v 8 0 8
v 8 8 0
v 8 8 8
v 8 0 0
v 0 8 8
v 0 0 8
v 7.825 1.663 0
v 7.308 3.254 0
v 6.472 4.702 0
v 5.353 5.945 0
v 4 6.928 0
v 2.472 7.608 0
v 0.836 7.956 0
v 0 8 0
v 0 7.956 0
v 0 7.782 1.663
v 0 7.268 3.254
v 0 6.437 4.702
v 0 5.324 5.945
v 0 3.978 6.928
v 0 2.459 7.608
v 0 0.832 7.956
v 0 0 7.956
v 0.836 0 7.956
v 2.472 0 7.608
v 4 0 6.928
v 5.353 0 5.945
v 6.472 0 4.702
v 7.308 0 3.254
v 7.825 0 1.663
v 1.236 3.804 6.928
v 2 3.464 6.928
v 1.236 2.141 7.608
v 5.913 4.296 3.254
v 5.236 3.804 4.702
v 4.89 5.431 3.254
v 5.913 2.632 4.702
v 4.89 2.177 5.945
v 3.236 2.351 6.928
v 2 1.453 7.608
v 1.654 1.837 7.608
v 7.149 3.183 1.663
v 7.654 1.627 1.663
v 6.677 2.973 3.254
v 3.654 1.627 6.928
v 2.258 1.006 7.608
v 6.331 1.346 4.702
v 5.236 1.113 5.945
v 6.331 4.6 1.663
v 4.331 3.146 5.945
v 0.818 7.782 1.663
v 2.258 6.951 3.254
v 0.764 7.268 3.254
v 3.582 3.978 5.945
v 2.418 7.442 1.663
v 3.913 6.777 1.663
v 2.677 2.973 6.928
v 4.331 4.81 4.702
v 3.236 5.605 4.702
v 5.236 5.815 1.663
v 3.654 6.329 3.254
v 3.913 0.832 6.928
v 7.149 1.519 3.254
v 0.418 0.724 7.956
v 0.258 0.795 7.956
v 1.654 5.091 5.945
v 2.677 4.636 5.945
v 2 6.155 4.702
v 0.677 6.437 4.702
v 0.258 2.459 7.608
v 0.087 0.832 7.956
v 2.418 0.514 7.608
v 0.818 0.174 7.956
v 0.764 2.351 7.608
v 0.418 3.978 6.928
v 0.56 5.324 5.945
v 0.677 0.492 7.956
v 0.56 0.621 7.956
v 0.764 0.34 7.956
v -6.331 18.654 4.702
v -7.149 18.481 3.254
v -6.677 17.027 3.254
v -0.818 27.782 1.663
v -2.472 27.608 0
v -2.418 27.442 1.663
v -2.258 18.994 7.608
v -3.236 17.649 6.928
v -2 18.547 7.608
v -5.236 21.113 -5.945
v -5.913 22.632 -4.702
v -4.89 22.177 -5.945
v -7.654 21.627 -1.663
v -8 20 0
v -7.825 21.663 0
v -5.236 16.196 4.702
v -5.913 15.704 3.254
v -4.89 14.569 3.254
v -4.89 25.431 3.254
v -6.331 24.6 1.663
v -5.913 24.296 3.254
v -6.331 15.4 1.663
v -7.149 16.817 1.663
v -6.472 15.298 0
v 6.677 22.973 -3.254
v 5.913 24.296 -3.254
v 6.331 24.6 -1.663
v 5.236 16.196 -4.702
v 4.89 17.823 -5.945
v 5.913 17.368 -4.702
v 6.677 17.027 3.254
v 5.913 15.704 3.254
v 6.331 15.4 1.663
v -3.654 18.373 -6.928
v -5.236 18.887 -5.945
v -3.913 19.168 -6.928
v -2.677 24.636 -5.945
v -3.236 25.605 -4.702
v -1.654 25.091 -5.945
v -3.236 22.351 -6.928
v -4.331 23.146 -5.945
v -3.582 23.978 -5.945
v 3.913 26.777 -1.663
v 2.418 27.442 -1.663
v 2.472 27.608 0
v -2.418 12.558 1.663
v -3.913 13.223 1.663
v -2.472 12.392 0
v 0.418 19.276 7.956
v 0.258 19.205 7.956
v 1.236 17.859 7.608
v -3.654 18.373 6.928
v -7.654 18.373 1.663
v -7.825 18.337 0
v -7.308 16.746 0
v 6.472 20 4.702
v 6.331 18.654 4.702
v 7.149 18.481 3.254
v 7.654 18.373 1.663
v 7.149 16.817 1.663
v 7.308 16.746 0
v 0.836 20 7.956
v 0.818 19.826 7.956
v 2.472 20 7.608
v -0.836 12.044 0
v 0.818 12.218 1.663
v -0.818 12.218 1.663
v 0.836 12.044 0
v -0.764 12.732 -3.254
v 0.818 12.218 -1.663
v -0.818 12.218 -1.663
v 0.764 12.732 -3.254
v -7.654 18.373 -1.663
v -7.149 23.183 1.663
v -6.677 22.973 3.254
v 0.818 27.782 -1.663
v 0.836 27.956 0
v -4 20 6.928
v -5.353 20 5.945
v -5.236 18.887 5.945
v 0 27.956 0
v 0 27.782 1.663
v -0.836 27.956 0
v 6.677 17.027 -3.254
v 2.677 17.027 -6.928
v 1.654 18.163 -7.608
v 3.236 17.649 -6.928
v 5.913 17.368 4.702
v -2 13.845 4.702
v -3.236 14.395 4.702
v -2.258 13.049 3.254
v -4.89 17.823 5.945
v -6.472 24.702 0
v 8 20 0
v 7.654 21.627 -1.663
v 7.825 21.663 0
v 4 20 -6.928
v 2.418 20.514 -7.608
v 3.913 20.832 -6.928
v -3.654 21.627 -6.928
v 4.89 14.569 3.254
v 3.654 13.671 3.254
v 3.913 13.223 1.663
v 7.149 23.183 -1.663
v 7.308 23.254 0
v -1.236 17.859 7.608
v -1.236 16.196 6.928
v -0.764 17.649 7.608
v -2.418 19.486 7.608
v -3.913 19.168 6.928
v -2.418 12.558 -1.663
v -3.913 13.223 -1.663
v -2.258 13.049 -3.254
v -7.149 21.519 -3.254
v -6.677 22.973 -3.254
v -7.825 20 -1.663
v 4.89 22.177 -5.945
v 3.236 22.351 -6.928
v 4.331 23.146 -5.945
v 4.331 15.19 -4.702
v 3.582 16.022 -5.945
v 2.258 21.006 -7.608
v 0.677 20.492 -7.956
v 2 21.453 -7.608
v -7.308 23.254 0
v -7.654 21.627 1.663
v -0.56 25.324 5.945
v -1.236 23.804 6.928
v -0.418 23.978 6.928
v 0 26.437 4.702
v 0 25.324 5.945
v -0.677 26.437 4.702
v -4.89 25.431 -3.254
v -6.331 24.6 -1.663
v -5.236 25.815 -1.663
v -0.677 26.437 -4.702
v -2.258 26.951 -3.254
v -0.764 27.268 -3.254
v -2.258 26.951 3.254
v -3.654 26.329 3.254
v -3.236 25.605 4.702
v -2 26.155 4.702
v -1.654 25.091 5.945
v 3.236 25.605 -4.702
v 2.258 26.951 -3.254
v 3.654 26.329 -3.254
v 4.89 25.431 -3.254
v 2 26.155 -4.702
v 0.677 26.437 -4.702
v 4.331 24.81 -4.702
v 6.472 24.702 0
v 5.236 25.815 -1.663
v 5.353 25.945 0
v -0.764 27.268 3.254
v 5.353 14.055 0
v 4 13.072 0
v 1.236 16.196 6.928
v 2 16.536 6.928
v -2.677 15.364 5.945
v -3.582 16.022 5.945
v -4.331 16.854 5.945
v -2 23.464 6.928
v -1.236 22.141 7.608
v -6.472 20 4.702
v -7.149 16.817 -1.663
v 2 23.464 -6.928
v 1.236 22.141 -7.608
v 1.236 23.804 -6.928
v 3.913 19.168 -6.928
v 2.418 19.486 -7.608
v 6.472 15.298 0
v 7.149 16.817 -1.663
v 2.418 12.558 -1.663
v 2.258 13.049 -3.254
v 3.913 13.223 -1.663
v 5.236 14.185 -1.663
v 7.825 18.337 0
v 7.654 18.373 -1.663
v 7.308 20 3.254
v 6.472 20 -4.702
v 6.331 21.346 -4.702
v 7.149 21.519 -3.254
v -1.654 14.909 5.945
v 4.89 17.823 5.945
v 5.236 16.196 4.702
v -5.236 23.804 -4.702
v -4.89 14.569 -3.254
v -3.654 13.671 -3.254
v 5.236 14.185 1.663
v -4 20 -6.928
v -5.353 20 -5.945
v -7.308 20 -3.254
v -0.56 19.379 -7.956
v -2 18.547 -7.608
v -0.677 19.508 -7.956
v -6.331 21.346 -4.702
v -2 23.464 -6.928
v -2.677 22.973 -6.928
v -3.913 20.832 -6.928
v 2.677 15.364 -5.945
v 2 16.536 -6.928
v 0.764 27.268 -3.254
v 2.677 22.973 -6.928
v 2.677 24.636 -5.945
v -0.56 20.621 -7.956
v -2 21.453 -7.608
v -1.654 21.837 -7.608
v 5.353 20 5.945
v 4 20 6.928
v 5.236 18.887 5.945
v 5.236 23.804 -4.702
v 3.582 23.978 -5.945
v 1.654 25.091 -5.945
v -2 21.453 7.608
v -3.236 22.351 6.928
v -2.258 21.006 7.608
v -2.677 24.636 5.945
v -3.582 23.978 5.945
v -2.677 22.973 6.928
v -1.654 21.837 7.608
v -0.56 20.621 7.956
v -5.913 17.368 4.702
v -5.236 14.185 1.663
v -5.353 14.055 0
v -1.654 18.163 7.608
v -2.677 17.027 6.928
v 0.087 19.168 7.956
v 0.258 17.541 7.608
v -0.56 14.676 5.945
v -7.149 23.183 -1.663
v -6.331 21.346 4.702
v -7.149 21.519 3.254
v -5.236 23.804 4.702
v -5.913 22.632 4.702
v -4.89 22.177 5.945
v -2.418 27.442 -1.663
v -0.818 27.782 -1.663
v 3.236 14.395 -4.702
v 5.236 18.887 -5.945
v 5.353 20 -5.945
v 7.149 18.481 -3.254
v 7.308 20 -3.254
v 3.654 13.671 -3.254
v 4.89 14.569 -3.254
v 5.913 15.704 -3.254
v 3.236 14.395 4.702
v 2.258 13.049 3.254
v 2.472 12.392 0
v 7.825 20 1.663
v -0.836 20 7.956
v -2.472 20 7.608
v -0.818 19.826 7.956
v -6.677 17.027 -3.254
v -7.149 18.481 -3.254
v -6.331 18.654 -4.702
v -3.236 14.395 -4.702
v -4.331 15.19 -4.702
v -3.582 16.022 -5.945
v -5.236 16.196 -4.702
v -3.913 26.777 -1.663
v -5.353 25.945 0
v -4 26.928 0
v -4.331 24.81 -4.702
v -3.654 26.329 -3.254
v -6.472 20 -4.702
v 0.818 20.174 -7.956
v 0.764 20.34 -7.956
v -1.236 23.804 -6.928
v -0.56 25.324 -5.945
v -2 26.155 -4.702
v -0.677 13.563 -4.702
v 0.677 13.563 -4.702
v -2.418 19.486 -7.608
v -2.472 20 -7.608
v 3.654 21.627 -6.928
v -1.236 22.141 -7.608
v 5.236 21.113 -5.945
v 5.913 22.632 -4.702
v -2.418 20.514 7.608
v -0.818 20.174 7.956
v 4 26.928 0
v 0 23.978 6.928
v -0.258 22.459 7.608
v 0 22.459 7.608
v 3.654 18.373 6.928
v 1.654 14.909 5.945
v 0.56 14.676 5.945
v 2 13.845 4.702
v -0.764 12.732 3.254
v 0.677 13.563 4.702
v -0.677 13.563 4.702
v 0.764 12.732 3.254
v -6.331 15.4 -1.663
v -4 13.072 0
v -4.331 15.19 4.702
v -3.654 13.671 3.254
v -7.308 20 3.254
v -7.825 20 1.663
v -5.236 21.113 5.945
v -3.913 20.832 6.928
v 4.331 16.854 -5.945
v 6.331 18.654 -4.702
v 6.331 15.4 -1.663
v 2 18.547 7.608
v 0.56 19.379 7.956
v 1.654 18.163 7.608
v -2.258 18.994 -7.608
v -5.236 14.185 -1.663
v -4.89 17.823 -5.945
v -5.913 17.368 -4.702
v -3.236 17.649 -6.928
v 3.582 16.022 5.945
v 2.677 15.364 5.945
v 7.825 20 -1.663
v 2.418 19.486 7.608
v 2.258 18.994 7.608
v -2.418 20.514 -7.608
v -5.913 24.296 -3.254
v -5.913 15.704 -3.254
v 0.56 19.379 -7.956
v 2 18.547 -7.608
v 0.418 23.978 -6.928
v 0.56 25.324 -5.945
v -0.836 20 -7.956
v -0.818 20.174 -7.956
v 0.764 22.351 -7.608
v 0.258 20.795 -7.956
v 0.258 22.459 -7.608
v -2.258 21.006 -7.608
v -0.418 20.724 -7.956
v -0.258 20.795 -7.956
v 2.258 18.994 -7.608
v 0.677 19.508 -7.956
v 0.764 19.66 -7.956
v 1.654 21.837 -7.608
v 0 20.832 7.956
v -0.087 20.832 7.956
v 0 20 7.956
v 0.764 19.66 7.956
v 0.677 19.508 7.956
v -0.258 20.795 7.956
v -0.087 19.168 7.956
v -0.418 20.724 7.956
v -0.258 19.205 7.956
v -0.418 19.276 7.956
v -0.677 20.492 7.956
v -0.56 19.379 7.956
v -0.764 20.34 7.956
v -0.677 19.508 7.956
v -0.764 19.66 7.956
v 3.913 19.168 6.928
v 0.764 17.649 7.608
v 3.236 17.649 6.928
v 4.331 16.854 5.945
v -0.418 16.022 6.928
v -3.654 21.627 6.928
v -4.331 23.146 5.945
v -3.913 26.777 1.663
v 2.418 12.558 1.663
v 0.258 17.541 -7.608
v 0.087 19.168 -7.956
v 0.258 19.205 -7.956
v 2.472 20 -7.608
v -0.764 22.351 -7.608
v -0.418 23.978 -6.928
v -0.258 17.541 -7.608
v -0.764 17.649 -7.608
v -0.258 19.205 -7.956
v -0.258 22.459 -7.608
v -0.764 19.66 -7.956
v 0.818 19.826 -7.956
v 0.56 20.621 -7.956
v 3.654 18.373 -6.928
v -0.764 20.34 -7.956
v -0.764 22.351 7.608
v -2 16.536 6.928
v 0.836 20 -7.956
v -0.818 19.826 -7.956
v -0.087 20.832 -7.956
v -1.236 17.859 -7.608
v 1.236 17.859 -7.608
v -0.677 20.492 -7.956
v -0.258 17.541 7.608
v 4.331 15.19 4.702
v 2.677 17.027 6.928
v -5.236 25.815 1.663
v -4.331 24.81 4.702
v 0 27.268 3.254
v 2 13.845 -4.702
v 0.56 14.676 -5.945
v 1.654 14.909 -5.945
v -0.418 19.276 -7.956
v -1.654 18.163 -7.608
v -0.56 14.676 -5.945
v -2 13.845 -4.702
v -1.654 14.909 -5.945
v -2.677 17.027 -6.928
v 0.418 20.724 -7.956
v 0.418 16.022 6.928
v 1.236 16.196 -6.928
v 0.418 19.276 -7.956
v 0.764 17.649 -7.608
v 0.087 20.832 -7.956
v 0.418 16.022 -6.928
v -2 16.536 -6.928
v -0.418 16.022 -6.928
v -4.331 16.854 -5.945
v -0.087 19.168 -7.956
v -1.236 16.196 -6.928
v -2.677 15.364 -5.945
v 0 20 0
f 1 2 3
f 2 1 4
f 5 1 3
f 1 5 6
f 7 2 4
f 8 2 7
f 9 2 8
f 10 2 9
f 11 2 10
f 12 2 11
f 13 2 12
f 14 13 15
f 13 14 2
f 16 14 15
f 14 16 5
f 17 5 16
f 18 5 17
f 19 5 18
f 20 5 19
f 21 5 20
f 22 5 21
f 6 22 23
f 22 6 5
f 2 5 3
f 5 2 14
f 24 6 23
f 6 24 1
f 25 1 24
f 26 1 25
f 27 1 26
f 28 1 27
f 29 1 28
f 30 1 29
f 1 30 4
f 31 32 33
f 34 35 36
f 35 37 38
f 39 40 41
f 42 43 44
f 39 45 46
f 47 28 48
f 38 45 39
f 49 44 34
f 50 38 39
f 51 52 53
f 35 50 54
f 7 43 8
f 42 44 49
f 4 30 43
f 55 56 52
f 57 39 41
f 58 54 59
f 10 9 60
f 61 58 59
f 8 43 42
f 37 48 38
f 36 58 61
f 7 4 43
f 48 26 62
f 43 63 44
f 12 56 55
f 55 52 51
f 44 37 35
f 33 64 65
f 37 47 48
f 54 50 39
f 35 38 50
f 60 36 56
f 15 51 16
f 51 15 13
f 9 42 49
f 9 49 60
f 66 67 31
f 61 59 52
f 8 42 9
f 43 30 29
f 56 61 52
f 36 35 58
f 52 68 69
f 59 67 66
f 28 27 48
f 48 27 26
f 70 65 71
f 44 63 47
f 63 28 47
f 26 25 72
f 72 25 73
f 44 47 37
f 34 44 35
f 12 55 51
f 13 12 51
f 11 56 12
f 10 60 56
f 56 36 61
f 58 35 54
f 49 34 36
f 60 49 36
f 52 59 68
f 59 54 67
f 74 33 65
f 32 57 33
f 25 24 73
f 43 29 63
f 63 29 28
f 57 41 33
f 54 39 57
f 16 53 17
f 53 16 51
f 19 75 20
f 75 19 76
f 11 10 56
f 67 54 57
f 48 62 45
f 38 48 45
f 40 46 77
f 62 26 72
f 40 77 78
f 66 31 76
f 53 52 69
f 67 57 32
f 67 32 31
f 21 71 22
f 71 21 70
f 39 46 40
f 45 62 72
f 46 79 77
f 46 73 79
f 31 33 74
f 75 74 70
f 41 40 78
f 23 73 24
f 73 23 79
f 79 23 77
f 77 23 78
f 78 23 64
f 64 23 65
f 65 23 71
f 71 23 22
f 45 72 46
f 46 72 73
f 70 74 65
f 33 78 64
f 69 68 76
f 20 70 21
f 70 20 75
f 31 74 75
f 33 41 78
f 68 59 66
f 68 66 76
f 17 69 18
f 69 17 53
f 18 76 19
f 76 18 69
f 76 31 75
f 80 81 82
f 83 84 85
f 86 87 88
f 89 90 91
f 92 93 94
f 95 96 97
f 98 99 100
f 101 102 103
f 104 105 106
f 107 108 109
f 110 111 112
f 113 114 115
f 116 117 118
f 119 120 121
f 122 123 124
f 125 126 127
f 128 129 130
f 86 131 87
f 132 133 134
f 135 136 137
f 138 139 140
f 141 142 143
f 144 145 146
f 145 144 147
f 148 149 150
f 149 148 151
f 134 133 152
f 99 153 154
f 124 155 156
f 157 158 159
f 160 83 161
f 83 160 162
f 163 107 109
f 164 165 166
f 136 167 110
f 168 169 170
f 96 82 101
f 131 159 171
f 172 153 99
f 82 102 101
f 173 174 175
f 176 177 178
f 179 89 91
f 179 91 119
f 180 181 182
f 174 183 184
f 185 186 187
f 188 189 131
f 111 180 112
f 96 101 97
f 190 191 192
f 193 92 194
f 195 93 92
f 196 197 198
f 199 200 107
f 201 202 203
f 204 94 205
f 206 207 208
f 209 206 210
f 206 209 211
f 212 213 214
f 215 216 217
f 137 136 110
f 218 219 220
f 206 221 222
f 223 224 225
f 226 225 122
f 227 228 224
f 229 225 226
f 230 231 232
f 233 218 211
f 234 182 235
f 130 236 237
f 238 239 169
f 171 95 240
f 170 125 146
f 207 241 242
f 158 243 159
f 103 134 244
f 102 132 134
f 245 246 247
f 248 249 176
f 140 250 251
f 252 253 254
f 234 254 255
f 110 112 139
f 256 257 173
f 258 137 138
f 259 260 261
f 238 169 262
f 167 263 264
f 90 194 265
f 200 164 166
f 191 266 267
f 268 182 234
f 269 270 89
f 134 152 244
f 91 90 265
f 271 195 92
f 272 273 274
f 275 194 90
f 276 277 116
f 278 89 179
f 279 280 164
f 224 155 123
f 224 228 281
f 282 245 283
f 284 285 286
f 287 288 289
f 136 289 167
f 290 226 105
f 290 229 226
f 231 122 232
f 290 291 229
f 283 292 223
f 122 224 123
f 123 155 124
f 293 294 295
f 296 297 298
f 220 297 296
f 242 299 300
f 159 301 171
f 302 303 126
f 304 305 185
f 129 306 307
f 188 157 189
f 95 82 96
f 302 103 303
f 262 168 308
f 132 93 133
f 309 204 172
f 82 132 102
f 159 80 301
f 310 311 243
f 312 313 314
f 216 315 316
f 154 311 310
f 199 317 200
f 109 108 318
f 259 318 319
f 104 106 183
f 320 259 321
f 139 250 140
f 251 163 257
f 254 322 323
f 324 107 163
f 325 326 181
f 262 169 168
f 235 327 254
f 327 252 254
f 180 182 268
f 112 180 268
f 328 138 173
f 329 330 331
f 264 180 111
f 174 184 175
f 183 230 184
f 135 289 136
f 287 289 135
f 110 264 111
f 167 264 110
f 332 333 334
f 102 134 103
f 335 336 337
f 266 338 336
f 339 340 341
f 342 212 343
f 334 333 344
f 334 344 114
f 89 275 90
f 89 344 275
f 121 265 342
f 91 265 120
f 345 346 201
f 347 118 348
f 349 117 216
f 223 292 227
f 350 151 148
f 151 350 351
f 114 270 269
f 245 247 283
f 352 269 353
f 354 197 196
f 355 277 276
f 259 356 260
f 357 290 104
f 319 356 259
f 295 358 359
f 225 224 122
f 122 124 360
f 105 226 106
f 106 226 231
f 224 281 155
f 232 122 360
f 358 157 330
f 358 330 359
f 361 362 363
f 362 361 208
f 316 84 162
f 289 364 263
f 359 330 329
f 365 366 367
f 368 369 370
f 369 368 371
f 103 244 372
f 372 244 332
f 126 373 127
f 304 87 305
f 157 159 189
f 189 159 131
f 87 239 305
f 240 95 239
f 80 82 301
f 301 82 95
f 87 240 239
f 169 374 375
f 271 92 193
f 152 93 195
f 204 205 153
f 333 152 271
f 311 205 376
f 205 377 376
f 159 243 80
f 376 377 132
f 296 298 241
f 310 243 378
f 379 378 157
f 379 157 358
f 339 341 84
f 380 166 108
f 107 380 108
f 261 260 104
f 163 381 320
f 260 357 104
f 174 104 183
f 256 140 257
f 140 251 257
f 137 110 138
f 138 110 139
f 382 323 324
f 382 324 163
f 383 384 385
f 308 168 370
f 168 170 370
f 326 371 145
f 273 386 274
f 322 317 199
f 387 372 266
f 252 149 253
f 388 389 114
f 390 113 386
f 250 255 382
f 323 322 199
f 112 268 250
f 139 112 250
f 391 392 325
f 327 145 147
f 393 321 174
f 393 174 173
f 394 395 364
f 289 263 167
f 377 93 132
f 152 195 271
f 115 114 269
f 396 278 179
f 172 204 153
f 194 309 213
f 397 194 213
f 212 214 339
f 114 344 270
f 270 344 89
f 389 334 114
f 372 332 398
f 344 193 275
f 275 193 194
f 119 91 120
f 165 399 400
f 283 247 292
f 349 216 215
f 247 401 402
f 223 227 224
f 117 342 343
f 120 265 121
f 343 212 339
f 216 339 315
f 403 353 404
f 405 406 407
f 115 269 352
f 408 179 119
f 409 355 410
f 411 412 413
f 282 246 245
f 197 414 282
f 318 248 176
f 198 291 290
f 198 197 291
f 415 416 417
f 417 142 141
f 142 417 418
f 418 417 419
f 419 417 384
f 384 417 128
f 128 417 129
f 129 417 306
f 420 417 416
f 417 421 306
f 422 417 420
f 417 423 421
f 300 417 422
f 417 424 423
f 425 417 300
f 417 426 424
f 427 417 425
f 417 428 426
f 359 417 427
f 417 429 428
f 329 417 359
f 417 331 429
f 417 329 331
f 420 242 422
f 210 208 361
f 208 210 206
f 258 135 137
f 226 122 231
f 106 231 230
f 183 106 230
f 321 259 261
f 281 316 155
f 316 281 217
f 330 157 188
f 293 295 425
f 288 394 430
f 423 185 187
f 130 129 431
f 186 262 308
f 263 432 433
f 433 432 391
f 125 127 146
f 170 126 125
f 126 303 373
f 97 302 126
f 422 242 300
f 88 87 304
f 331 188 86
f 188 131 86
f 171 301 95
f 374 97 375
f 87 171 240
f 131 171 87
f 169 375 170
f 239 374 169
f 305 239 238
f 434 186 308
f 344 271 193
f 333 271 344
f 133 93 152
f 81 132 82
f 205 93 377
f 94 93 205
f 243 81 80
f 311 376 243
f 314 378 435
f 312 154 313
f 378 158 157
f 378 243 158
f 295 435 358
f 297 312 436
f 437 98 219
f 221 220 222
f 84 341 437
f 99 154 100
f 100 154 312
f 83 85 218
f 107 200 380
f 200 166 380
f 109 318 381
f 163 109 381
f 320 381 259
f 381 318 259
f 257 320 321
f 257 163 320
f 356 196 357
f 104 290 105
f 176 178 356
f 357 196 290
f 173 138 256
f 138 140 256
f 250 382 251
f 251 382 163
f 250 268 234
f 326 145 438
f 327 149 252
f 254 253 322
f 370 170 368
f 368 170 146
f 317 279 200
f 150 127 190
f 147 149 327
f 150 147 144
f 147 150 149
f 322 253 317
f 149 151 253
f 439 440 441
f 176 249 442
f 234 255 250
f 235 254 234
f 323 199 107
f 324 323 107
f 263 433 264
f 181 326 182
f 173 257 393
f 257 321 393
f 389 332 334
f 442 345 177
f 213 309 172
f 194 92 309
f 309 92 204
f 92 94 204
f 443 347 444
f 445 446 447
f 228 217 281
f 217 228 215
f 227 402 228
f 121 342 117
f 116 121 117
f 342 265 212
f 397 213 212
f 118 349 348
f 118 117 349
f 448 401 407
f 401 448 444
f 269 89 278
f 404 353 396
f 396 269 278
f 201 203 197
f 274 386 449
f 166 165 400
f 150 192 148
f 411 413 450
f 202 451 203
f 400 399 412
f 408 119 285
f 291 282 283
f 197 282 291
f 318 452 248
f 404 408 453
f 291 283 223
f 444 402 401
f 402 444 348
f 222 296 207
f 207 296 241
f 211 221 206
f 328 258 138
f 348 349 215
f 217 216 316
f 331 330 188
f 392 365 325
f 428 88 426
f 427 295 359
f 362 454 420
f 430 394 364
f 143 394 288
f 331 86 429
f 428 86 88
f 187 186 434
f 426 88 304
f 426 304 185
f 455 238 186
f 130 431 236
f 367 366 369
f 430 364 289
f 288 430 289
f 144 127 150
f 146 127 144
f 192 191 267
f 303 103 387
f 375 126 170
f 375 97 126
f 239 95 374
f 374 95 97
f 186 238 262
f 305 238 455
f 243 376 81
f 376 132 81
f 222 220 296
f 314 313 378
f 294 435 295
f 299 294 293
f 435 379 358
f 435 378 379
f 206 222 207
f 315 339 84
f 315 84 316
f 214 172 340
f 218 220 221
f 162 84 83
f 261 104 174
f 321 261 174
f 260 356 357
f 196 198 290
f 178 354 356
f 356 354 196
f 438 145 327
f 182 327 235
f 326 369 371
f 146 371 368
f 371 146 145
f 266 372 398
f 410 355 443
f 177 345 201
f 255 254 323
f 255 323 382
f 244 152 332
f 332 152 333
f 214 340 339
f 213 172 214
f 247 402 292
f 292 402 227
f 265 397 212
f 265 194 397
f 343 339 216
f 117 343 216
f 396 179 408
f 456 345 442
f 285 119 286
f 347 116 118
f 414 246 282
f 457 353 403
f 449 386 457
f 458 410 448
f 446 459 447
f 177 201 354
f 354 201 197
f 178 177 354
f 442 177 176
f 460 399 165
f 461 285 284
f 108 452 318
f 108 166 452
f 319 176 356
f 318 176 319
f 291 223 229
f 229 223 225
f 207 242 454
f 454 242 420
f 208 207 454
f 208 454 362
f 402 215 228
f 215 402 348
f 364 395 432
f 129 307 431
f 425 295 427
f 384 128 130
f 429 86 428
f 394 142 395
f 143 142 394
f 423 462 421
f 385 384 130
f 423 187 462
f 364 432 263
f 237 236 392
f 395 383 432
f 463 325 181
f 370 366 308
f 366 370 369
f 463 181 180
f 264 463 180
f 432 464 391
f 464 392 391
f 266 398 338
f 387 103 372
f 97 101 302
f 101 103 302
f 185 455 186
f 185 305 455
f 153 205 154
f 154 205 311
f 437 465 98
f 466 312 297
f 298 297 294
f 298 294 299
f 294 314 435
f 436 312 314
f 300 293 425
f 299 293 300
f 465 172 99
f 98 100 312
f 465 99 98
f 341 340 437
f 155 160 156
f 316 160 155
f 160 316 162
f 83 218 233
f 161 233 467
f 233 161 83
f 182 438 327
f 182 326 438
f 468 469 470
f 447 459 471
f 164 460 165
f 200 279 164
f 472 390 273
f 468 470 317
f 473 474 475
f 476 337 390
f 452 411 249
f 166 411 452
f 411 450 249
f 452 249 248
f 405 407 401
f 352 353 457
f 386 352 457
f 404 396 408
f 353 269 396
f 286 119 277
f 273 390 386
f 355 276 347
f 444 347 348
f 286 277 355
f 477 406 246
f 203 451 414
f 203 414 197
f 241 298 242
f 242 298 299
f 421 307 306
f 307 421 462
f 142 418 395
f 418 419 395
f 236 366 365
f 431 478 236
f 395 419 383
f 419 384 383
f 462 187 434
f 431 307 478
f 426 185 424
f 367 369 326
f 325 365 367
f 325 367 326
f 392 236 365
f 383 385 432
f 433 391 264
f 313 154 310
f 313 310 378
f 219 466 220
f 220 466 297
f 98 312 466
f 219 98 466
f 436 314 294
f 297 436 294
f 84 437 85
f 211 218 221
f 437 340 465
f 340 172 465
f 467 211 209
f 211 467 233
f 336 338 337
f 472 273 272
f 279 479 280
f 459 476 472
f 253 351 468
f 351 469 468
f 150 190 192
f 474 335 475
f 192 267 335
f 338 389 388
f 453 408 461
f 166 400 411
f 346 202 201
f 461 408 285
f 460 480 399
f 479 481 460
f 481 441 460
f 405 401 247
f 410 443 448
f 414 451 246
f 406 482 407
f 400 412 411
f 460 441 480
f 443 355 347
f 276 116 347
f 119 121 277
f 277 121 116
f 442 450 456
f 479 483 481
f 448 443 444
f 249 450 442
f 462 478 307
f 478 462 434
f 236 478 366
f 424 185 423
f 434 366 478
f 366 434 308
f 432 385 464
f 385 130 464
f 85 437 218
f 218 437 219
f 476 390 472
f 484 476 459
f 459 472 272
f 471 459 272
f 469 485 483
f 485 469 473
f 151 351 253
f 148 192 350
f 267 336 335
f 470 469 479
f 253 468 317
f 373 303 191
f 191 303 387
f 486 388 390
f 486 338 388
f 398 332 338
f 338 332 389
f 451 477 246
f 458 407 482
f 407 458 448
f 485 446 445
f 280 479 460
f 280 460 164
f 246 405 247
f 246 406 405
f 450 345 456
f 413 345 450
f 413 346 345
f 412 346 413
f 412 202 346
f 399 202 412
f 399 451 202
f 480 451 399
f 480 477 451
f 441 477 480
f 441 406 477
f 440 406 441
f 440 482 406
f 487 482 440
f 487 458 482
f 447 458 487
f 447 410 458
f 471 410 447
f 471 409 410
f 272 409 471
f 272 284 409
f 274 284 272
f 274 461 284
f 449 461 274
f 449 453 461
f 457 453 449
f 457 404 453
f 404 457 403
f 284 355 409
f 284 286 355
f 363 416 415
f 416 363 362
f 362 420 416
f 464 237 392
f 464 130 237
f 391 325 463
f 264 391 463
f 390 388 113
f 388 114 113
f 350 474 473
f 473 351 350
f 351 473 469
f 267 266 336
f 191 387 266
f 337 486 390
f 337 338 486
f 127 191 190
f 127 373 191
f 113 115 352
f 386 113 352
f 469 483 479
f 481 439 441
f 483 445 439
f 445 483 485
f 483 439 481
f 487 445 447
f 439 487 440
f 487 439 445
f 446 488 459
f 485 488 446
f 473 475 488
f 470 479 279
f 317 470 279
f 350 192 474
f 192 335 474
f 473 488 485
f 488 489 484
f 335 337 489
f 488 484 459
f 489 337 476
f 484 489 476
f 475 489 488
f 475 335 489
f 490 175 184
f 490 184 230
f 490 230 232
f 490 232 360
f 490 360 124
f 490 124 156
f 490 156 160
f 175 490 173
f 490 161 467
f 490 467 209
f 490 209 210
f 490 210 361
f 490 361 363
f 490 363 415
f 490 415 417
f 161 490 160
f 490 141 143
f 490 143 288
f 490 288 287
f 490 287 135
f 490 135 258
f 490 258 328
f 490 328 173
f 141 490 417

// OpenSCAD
$fn = 30;

difference() {
    cube(8);
    sphere(8);
}

translate([0,20,0]) {
    difference() {
        sphere(8);
        cube(8);
    }
}
